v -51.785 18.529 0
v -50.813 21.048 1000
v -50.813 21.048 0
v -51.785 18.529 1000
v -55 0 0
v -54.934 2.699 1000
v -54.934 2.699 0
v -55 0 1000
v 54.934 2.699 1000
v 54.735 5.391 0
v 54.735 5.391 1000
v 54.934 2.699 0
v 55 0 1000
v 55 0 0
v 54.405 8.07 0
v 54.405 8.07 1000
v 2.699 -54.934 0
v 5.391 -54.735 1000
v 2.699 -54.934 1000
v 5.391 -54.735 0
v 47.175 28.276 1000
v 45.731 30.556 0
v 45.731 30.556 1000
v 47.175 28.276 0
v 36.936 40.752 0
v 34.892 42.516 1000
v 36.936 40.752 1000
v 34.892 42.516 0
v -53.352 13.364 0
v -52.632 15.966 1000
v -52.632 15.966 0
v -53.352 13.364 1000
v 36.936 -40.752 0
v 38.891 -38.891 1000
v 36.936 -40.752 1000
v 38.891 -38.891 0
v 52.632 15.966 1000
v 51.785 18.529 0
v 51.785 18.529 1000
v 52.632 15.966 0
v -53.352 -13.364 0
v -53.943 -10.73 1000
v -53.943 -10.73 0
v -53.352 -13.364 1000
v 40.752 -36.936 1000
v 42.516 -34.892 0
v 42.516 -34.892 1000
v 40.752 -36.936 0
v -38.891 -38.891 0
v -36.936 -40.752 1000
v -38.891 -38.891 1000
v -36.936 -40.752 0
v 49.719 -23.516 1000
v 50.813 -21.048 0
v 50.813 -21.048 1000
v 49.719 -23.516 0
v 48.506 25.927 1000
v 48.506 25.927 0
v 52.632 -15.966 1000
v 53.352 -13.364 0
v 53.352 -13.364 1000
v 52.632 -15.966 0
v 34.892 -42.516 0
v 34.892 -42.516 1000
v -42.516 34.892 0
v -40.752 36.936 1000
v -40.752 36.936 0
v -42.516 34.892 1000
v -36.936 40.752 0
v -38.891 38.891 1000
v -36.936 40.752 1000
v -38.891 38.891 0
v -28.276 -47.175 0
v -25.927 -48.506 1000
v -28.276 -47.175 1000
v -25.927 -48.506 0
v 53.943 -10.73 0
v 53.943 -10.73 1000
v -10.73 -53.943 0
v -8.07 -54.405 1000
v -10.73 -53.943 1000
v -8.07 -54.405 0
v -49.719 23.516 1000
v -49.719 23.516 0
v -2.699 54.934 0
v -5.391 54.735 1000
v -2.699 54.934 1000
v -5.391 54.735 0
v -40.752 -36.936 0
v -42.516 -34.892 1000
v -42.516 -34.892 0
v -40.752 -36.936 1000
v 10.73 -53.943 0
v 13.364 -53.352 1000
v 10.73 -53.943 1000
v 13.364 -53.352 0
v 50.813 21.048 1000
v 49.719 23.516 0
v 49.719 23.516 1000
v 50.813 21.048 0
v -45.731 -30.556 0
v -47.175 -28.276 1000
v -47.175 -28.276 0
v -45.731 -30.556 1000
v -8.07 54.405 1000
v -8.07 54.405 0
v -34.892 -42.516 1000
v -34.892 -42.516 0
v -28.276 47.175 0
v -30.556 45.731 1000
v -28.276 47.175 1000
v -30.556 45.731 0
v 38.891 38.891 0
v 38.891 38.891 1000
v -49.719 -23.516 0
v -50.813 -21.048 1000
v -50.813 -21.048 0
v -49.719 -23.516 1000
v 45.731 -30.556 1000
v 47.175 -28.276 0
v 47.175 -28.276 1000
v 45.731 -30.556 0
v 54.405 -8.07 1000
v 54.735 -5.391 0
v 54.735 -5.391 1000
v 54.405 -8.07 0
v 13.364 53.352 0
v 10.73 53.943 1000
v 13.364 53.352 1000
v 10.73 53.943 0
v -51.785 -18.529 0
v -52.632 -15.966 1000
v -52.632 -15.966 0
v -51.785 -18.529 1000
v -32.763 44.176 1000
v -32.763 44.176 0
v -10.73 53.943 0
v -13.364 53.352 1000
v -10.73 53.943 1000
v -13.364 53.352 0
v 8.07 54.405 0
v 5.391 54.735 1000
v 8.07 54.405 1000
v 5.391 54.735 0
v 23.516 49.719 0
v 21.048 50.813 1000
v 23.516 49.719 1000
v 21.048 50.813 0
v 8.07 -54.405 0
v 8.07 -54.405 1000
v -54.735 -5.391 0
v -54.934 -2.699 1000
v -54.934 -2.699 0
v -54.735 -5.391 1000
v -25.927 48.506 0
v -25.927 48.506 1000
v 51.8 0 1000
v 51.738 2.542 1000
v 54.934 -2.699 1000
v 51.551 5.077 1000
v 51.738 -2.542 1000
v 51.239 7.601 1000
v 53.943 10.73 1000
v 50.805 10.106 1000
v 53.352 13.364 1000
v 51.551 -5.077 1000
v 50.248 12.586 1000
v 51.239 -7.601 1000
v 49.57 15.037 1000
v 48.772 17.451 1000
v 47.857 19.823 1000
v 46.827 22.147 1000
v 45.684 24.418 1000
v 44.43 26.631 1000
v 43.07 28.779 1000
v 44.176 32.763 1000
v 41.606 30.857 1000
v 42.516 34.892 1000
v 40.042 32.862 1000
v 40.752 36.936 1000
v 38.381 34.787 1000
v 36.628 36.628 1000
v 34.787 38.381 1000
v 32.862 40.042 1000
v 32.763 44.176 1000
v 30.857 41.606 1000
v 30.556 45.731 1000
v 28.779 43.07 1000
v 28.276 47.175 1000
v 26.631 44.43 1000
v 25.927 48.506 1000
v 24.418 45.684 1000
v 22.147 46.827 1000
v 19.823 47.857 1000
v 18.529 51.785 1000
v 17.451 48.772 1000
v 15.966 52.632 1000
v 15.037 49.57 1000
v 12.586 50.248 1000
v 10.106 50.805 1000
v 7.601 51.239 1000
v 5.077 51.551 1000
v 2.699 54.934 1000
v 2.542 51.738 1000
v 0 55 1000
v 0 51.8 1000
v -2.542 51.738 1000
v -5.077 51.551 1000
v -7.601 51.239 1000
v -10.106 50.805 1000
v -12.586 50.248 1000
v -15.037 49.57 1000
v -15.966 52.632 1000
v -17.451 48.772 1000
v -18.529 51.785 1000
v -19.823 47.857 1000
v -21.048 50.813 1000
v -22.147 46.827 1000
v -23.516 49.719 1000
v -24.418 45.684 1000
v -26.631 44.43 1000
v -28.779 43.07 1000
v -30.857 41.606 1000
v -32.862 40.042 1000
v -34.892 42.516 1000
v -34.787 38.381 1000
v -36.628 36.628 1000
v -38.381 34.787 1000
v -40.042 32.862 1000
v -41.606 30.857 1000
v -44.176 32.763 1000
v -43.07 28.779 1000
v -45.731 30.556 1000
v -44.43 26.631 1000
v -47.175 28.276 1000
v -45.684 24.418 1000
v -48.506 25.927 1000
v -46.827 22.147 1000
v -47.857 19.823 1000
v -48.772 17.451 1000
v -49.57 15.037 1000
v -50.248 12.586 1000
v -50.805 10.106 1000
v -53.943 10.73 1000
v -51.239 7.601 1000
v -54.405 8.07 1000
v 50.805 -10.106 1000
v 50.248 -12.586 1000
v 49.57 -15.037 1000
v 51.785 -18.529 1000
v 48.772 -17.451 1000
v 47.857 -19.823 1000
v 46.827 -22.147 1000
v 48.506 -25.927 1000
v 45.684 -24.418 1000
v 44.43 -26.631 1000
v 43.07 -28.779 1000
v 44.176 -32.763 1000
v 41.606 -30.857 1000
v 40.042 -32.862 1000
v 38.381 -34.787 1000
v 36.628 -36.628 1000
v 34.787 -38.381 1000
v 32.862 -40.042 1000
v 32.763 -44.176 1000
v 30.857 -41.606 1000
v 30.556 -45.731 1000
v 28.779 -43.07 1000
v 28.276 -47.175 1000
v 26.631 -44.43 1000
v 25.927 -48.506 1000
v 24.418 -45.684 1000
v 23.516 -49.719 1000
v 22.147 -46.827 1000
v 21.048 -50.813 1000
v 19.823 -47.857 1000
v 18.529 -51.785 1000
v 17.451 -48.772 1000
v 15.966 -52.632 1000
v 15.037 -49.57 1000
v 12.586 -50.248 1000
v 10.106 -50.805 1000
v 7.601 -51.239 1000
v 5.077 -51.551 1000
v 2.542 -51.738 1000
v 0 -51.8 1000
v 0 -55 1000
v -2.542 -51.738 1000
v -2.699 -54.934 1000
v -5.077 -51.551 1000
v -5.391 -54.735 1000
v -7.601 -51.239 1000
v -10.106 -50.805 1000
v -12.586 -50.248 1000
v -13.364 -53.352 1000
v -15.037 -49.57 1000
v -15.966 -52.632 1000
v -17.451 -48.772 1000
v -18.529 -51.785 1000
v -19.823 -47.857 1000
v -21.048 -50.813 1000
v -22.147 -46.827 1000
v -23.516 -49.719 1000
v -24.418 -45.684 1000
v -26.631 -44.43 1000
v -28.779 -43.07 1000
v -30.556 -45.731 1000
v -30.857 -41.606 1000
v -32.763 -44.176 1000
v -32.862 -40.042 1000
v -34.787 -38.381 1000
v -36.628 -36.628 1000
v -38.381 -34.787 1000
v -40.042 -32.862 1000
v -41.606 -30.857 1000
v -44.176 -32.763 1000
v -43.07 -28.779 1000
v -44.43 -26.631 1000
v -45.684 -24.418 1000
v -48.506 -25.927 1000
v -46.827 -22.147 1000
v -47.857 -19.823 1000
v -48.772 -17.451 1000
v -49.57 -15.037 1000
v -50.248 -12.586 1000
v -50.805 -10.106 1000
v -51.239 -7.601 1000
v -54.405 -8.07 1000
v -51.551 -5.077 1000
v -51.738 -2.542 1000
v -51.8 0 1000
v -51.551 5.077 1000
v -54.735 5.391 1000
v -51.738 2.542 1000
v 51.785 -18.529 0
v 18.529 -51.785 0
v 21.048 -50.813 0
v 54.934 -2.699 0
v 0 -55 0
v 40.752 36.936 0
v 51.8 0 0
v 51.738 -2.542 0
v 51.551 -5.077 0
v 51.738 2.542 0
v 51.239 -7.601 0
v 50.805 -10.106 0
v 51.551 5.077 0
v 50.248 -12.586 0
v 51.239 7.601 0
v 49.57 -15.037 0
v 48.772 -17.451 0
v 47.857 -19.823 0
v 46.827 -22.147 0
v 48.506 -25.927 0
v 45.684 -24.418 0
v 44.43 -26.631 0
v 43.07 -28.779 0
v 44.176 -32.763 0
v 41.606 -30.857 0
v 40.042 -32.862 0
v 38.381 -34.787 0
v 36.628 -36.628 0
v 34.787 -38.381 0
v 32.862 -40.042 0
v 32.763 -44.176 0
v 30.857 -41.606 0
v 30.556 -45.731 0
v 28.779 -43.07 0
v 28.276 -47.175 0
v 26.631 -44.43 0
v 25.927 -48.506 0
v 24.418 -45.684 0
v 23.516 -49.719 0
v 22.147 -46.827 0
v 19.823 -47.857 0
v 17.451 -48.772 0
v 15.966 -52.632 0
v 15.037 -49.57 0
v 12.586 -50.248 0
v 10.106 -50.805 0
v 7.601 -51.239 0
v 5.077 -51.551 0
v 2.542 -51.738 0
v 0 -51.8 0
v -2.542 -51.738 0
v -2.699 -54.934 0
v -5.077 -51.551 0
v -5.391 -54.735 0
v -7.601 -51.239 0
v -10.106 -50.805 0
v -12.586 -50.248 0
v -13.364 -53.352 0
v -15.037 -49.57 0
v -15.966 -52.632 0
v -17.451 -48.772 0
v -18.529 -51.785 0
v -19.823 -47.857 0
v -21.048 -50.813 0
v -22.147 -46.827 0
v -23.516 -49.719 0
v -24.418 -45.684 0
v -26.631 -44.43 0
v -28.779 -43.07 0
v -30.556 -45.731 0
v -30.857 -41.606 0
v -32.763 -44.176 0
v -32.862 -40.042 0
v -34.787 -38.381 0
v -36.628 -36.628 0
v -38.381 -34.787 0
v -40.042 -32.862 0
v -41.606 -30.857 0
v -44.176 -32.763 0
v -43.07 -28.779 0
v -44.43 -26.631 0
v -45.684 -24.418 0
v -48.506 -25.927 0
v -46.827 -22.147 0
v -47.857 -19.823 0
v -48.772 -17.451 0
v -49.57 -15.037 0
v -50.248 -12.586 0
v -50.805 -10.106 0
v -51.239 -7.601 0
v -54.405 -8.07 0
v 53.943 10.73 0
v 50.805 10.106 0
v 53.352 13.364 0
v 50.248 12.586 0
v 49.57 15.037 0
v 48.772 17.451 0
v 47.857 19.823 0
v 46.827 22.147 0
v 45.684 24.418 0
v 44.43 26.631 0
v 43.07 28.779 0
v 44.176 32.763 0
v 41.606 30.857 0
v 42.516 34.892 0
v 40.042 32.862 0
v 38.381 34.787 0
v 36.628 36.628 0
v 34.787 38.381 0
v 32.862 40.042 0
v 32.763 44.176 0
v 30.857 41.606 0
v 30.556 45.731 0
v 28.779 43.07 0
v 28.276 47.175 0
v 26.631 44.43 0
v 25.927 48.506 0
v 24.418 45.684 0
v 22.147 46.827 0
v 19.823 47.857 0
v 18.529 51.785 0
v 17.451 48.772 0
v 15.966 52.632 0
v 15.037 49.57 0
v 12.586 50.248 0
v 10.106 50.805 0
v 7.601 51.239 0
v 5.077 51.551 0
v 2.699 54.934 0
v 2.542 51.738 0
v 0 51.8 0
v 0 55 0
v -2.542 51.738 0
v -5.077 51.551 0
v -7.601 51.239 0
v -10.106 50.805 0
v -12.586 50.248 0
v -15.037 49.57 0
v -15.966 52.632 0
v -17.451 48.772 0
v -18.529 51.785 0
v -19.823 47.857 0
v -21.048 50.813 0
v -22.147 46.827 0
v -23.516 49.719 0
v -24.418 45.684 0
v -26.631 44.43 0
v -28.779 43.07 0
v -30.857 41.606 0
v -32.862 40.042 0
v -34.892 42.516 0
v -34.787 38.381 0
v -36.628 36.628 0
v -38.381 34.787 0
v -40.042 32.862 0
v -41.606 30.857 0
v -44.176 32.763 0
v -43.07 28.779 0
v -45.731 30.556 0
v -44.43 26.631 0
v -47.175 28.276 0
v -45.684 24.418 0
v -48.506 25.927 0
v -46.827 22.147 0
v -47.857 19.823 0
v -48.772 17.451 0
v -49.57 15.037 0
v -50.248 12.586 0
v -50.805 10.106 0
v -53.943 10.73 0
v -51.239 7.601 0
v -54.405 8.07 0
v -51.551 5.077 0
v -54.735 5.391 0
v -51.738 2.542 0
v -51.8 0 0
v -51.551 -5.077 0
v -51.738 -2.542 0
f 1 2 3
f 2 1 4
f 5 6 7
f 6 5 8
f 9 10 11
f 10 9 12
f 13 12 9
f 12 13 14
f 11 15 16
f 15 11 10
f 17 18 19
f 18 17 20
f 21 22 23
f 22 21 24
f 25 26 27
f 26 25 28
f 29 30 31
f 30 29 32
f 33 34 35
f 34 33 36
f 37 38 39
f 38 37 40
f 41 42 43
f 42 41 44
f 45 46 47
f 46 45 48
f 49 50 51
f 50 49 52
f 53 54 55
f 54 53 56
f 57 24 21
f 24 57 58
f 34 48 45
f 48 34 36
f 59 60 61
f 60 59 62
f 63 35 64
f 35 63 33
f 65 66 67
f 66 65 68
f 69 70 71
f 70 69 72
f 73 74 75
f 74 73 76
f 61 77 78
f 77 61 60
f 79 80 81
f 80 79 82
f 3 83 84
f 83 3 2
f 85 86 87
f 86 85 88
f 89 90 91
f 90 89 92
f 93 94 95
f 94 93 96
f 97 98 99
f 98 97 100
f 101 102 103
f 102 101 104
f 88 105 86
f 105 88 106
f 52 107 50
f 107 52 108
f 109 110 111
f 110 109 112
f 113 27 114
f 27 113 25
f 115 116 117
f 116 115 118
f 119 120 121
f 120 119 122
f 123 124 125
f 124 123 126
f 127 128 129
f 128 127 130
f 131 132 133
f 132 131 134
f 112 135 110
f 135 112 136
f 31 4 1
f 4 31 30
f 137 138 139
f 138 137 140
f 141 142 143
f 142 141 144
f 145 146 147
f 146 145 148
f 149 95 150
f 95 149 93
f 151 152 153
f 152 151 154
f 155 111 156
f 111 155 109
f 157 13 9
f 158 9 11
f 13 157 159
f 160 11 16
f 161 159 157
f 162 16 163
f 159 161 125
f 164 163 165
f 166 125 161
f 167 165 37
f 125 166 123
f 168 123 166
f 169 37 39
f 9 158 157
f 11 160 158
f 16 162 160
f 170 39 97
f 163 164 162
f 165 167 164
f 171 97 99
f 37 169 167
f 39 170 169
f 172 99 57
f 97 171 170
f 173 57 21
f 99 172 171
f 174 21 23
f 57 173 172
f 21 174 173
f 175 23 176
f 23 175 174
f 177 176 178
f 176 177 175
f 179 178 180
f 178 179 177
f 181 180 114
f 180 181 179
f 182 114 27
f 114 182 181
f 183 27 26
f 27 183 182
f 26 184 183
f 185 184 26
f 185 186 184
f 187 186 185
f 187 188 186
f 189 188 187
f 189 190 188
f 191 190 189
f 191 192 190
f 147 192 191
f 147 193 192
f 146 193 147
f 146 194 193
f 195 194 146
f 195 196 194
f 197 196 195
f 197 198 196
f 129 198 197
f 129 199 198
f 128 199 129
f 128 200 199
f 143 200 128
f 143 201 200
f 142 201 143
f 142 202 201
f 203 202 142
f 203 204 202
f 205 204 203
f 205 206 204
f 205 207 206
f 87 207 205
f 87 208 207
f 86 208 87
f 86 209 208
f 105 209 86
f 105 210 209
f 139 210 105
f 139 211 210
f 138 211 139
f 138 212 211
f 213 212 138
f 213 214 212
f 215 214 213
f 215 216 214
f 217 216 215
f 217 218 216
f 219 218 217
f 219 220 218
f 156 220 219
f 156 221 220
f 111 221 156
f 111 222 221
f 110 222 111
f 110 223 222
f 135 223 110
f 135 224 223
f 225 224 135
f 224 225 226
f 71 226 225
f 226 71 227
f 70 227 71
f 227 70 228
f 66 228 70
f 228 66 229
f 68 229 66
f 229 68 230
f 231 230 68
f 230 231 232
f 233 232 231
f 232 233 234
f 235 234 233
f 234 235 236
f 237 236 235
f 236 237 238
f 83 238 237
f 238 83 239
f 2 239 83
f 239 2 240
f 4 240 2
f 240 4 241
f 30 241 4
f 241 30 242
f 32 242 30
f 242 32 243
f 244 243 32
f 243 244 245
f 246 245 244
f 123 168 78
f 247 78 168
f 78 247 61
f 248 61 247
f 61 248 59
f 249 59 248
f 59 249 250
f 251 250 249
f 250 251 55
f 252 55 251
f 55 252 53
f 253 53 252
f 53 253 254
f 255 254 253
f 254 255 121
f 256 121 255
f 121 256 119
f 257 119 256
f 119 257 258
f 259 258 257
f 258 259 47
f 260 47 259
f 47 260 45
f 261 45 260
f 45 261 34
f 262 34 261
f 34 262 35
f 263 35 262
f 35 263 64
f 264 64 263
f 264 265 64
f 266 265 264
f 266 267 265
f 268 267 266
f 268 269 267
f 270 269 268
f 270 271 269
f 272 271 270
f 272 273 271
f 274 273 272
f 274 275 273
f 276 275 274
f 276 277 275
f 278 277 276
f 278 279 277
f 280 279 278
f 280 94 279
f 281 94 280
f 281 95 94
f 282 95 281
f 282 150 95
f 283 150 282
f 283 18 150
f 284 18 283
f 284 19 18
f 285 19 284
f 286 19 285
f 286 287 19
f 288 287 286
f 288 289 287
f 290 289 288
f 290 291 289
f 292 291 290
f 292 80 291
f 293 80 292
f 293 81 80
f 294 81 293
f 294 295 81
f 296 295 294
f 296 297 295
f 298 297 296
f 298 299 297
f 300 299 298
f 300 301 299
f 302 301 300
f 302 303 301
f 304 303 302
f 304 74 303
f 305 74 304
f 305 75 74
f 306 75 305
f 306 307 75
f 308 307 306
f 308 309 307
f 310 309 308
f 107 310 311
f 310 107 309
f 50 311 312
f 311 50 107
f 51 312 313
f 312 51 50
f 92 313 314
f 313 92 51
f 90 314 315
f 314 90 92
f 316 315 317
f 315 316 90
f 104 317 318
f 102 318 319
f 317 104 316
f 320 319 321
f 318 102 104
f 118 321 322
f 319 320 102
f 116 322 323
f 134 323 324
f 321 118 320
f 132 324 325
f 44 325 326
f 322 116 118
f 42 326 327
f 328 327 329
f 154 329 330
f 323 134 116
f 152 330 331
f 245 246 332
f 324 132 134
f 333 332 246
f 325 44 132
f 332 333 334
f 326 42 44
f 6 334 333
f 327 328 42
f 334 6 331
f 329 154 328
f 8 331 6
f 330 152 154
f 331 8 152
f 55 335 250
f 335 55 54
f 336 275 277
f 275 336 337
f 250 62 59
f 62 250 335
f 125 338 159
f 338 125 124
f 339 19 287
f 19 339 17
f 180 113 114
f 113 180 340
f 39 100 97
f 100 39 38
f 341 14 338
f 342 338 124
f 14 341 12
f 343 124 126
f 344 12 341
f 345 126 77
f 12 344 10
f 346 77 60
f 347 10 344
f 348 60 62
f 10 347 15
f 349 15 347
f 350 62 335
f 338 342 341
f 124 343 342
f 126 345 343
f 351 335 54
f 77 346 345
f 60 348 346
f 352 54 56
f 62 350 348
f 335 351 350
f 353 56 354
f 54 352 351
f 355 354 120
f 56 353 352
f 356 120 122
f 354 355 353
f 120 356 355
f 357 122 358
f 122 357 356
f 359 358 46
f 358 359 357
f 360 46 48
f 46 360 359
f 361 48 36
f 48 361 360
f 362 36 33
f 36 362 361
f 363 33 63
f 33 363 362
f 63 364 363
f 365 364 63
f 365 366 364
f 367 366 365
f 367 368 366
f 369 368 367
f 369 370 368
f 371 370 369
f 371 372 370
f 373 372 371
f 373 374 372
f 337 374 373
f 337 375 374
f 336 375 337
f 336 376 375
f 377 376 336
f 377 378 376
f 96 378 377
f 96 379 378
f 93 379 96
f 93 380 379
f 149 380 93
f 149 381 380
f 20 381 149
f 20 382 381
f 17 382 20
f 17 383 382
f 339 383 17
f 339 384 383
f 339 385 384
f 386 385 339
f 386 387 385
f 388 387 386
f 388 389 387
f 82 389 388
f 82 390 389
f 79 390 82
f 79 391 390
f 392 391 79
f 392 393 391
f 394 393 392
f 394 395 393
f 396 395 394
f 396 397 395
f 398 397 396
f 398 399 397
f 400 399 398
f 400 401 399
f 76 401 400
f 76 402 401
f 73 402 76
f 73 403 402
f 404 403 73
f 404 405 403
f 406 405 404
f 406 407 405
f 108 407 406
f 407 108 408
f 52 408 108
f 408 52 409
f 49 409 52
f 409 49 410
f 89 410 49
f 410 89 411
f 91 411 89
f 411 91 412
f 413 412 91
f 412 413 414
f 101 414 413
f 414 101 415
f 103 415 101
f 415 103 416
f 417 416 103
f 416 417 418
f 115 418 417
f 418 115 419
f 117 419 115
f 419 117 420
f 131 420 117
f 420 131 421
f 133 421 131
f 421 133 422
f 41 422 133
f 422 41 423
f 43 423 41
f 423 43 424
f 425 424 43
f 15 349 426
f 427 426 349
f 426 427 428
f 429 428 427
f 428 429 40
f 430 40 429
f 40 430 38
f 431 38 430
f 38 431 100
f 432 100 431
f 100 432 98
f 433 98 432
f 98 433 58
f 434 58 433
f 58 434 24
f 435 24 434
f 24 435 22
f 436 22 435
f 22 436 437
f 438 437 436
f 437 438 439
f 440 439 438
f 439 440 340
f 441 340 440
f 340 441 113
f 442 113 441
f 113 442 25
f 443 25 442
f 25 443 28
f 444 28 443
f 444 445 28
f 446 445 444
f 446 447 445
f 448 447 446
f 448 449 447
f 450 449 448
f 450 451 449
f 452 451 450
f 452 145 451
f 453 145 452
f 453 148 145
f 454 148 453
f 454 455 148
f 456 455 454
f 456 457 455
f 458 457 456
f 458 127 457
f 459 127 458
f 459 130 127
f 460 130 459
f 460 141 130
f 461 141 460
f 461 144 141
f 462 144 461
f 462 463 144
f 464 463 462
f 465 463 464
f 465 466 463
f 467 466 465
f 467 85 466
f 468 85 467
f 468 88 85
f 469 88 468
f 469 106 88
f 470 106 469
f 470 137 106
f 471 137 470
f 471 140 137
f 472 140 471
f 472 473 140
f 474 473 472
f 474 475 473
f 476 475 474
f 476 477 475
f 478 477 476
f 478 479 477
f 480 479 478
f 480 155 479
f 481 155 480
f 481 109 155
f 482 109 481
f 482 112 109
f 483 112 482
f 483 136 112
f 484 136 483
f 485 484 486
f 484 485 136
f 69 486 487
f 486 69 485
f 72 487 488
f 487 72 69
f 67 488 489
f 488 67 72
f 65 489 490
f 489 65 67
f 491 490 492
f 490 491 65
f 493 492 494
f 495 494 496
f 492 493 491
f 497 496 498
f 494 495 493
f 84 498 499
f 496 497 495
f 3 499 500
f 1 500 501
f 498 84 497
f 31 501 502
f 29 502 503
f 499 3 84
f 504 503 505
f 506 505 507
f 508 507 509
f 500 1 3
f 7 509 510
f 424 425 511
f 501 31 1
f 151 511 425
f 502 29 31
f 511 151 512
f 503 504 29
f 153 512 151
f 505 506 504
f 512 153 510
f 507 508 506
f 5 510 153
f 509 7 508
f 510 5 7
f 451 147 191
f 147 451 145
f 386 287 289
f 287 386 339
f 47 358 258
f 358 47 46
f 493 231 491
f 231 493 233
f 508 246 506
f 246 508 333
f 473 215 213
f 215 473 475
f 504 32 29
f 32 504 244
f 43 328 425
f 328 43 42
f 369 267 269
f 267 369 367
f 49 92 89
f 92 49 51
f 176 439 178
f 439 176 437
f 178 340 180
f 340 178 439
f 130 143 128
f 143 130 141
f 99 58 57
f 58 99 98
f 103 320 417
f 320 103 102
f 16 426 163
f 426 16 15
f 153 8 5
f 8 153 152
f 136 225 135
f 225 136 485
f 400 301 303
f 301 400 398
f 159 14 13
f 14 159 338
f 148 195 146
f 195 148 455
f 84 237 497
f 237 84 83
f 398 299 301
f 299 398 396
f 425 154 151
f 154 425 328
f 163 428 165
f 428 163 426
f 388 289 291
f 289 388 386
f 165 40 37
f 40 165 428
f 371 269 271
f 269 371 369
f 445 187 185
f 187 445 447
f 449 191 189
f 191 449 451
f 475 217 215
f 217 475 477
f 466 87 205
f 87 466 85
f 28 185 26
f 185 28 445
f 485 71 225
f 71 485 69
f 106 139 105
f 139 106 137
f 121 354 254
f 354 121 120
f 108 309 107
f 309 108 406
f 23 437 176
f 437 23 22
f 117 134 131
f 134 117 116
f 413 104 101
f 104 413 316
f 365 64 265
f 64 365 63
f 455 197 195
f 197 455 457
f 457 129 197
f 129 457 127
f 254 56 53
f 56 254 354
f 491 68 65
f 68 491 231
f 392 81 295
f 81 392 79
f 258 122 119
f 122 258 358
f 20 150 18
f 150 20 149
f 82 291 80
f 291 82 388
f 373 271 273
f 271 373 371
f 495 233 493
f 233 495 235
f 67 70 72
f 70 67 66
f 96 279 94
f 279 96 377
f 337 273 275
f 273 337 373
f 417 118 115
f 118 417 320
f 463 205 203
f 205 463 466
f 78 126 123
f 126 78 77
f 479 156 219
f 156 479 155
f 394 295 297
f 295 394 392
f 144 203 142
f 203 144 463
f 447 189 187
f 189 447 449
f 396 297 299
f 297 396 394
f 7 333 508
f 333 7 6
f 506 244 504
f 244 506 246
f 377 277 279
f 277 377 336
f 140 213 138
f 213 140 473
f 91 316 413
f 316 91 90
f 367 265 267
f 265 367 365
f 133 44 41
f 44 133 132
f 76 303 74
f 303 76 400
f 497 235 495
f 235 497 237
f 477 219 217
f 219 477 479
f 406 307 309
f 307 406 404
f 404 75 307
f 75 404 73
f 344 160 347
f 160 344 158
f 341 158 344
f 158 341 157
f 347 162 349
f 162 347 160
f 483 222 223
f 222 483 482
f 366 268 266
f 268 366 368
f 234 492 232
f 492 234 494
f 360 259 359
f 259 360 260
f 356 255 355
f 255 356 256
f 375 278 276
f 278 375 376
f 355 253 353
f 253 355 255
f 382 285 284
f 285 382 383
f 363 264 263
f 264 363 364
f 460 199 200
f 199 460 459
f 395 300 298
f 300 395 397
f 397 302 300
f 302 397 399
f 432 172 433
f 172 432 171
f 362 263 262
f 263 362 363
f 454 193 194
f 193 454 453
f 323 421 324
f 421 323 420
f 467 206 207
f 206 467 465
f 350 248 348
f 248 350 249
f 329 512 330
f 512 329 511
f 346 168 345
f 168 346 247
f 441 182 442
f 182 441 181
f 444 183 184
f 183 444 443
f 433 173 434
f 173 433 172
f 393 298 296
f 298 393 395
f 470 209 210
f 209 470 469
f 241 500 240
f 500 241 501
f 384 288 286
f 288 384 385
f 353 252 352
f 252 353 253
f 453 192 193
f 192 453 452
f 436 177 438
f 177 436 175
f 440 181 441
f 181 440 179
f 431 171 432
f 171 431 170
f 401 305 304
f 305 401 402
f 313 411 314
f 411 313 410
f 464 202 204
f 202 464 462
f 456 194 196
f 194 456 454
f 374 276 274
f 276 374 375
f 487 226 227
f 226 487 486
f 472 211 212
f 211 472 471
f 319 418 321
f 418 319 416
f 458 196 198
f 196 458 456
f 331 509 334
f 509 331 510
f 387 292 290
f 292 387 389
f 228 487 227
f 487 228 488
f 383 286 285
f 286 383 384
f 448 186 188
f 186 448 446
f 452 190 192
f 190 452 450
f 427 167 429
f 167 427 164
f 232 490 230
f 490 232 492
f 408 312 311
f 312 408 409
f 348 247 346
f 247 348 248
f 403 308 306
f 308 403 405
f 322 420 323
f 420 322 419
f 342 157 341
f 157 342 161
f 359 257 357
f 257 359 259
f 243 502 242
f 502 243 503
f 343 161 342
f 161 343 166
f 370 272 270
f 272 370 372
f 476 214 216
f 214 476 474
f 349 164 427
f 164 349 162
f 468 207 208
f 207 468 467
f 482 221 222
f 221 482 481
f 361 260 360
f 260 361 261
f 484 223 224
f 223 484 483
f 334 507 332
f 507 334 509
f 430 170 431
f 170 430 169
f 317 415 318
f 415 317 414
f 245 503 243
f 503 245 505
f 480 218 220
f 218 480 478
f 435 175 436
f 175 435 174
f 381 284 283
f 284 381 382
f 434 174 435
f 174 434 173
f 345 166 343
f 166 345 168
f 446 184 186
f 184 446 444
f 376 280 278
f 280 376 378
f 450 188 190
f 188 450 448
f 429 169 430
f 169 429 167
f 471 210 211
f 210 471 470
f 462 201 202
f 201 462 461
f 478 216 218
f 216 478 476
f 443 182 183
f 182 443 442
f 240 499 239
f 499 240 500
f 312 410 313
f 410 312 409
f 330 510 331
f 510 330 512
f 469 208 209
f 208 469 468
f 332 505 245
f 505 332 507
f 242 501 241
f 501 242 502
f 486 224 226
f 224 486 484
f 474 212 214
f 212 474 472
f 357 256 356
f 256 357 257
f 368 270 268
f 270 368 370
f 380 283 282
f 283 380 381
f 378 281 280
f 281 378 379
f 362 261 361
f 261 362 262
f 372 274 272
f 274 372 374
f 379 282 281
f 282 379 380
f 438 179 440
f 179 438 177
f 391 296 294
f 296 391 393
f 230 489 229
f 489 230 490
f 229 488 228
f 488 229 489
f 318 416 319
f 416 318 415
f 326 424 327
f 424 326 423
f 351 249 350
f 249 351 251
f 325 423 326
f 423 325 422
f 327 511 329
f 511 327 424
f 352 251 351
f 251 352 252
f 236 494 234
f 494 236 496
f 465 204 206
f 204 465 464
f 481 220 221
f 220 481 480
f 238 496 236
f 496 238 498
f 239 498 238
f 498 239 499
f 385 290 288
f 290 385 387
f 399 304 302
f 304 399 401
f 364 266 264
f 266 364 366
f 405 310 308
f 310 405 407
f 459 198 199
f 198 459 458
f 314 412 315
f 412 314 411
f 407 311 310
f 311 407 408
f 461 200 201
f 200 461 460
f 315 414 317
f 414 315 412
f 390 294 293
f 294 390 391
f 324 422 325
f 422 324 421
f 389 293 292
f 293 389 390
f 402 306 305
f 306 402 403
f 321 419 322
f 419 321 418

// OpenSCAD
$fn = 128;

// HT pipe parameters (approximate for HT 110)
pipe_length = 1000;          // mm
outer_diameter = 110;        // mm (nominal)
wall_thickness = 3.2;        // mm (typical for HT 110)
inner_diameter = outer_diameter - 2*wall_thickness;

module ht_pipe(od, id, L) {
    difference() {
        cylinder(h = L, d = od, center = false);
        translate([0,0,-0.1])
            cylinder(h = L + 0.2, d = id, center = false);
    }
}

ht_pipe(outer_diameter, inner_diameter, pipe_length);
